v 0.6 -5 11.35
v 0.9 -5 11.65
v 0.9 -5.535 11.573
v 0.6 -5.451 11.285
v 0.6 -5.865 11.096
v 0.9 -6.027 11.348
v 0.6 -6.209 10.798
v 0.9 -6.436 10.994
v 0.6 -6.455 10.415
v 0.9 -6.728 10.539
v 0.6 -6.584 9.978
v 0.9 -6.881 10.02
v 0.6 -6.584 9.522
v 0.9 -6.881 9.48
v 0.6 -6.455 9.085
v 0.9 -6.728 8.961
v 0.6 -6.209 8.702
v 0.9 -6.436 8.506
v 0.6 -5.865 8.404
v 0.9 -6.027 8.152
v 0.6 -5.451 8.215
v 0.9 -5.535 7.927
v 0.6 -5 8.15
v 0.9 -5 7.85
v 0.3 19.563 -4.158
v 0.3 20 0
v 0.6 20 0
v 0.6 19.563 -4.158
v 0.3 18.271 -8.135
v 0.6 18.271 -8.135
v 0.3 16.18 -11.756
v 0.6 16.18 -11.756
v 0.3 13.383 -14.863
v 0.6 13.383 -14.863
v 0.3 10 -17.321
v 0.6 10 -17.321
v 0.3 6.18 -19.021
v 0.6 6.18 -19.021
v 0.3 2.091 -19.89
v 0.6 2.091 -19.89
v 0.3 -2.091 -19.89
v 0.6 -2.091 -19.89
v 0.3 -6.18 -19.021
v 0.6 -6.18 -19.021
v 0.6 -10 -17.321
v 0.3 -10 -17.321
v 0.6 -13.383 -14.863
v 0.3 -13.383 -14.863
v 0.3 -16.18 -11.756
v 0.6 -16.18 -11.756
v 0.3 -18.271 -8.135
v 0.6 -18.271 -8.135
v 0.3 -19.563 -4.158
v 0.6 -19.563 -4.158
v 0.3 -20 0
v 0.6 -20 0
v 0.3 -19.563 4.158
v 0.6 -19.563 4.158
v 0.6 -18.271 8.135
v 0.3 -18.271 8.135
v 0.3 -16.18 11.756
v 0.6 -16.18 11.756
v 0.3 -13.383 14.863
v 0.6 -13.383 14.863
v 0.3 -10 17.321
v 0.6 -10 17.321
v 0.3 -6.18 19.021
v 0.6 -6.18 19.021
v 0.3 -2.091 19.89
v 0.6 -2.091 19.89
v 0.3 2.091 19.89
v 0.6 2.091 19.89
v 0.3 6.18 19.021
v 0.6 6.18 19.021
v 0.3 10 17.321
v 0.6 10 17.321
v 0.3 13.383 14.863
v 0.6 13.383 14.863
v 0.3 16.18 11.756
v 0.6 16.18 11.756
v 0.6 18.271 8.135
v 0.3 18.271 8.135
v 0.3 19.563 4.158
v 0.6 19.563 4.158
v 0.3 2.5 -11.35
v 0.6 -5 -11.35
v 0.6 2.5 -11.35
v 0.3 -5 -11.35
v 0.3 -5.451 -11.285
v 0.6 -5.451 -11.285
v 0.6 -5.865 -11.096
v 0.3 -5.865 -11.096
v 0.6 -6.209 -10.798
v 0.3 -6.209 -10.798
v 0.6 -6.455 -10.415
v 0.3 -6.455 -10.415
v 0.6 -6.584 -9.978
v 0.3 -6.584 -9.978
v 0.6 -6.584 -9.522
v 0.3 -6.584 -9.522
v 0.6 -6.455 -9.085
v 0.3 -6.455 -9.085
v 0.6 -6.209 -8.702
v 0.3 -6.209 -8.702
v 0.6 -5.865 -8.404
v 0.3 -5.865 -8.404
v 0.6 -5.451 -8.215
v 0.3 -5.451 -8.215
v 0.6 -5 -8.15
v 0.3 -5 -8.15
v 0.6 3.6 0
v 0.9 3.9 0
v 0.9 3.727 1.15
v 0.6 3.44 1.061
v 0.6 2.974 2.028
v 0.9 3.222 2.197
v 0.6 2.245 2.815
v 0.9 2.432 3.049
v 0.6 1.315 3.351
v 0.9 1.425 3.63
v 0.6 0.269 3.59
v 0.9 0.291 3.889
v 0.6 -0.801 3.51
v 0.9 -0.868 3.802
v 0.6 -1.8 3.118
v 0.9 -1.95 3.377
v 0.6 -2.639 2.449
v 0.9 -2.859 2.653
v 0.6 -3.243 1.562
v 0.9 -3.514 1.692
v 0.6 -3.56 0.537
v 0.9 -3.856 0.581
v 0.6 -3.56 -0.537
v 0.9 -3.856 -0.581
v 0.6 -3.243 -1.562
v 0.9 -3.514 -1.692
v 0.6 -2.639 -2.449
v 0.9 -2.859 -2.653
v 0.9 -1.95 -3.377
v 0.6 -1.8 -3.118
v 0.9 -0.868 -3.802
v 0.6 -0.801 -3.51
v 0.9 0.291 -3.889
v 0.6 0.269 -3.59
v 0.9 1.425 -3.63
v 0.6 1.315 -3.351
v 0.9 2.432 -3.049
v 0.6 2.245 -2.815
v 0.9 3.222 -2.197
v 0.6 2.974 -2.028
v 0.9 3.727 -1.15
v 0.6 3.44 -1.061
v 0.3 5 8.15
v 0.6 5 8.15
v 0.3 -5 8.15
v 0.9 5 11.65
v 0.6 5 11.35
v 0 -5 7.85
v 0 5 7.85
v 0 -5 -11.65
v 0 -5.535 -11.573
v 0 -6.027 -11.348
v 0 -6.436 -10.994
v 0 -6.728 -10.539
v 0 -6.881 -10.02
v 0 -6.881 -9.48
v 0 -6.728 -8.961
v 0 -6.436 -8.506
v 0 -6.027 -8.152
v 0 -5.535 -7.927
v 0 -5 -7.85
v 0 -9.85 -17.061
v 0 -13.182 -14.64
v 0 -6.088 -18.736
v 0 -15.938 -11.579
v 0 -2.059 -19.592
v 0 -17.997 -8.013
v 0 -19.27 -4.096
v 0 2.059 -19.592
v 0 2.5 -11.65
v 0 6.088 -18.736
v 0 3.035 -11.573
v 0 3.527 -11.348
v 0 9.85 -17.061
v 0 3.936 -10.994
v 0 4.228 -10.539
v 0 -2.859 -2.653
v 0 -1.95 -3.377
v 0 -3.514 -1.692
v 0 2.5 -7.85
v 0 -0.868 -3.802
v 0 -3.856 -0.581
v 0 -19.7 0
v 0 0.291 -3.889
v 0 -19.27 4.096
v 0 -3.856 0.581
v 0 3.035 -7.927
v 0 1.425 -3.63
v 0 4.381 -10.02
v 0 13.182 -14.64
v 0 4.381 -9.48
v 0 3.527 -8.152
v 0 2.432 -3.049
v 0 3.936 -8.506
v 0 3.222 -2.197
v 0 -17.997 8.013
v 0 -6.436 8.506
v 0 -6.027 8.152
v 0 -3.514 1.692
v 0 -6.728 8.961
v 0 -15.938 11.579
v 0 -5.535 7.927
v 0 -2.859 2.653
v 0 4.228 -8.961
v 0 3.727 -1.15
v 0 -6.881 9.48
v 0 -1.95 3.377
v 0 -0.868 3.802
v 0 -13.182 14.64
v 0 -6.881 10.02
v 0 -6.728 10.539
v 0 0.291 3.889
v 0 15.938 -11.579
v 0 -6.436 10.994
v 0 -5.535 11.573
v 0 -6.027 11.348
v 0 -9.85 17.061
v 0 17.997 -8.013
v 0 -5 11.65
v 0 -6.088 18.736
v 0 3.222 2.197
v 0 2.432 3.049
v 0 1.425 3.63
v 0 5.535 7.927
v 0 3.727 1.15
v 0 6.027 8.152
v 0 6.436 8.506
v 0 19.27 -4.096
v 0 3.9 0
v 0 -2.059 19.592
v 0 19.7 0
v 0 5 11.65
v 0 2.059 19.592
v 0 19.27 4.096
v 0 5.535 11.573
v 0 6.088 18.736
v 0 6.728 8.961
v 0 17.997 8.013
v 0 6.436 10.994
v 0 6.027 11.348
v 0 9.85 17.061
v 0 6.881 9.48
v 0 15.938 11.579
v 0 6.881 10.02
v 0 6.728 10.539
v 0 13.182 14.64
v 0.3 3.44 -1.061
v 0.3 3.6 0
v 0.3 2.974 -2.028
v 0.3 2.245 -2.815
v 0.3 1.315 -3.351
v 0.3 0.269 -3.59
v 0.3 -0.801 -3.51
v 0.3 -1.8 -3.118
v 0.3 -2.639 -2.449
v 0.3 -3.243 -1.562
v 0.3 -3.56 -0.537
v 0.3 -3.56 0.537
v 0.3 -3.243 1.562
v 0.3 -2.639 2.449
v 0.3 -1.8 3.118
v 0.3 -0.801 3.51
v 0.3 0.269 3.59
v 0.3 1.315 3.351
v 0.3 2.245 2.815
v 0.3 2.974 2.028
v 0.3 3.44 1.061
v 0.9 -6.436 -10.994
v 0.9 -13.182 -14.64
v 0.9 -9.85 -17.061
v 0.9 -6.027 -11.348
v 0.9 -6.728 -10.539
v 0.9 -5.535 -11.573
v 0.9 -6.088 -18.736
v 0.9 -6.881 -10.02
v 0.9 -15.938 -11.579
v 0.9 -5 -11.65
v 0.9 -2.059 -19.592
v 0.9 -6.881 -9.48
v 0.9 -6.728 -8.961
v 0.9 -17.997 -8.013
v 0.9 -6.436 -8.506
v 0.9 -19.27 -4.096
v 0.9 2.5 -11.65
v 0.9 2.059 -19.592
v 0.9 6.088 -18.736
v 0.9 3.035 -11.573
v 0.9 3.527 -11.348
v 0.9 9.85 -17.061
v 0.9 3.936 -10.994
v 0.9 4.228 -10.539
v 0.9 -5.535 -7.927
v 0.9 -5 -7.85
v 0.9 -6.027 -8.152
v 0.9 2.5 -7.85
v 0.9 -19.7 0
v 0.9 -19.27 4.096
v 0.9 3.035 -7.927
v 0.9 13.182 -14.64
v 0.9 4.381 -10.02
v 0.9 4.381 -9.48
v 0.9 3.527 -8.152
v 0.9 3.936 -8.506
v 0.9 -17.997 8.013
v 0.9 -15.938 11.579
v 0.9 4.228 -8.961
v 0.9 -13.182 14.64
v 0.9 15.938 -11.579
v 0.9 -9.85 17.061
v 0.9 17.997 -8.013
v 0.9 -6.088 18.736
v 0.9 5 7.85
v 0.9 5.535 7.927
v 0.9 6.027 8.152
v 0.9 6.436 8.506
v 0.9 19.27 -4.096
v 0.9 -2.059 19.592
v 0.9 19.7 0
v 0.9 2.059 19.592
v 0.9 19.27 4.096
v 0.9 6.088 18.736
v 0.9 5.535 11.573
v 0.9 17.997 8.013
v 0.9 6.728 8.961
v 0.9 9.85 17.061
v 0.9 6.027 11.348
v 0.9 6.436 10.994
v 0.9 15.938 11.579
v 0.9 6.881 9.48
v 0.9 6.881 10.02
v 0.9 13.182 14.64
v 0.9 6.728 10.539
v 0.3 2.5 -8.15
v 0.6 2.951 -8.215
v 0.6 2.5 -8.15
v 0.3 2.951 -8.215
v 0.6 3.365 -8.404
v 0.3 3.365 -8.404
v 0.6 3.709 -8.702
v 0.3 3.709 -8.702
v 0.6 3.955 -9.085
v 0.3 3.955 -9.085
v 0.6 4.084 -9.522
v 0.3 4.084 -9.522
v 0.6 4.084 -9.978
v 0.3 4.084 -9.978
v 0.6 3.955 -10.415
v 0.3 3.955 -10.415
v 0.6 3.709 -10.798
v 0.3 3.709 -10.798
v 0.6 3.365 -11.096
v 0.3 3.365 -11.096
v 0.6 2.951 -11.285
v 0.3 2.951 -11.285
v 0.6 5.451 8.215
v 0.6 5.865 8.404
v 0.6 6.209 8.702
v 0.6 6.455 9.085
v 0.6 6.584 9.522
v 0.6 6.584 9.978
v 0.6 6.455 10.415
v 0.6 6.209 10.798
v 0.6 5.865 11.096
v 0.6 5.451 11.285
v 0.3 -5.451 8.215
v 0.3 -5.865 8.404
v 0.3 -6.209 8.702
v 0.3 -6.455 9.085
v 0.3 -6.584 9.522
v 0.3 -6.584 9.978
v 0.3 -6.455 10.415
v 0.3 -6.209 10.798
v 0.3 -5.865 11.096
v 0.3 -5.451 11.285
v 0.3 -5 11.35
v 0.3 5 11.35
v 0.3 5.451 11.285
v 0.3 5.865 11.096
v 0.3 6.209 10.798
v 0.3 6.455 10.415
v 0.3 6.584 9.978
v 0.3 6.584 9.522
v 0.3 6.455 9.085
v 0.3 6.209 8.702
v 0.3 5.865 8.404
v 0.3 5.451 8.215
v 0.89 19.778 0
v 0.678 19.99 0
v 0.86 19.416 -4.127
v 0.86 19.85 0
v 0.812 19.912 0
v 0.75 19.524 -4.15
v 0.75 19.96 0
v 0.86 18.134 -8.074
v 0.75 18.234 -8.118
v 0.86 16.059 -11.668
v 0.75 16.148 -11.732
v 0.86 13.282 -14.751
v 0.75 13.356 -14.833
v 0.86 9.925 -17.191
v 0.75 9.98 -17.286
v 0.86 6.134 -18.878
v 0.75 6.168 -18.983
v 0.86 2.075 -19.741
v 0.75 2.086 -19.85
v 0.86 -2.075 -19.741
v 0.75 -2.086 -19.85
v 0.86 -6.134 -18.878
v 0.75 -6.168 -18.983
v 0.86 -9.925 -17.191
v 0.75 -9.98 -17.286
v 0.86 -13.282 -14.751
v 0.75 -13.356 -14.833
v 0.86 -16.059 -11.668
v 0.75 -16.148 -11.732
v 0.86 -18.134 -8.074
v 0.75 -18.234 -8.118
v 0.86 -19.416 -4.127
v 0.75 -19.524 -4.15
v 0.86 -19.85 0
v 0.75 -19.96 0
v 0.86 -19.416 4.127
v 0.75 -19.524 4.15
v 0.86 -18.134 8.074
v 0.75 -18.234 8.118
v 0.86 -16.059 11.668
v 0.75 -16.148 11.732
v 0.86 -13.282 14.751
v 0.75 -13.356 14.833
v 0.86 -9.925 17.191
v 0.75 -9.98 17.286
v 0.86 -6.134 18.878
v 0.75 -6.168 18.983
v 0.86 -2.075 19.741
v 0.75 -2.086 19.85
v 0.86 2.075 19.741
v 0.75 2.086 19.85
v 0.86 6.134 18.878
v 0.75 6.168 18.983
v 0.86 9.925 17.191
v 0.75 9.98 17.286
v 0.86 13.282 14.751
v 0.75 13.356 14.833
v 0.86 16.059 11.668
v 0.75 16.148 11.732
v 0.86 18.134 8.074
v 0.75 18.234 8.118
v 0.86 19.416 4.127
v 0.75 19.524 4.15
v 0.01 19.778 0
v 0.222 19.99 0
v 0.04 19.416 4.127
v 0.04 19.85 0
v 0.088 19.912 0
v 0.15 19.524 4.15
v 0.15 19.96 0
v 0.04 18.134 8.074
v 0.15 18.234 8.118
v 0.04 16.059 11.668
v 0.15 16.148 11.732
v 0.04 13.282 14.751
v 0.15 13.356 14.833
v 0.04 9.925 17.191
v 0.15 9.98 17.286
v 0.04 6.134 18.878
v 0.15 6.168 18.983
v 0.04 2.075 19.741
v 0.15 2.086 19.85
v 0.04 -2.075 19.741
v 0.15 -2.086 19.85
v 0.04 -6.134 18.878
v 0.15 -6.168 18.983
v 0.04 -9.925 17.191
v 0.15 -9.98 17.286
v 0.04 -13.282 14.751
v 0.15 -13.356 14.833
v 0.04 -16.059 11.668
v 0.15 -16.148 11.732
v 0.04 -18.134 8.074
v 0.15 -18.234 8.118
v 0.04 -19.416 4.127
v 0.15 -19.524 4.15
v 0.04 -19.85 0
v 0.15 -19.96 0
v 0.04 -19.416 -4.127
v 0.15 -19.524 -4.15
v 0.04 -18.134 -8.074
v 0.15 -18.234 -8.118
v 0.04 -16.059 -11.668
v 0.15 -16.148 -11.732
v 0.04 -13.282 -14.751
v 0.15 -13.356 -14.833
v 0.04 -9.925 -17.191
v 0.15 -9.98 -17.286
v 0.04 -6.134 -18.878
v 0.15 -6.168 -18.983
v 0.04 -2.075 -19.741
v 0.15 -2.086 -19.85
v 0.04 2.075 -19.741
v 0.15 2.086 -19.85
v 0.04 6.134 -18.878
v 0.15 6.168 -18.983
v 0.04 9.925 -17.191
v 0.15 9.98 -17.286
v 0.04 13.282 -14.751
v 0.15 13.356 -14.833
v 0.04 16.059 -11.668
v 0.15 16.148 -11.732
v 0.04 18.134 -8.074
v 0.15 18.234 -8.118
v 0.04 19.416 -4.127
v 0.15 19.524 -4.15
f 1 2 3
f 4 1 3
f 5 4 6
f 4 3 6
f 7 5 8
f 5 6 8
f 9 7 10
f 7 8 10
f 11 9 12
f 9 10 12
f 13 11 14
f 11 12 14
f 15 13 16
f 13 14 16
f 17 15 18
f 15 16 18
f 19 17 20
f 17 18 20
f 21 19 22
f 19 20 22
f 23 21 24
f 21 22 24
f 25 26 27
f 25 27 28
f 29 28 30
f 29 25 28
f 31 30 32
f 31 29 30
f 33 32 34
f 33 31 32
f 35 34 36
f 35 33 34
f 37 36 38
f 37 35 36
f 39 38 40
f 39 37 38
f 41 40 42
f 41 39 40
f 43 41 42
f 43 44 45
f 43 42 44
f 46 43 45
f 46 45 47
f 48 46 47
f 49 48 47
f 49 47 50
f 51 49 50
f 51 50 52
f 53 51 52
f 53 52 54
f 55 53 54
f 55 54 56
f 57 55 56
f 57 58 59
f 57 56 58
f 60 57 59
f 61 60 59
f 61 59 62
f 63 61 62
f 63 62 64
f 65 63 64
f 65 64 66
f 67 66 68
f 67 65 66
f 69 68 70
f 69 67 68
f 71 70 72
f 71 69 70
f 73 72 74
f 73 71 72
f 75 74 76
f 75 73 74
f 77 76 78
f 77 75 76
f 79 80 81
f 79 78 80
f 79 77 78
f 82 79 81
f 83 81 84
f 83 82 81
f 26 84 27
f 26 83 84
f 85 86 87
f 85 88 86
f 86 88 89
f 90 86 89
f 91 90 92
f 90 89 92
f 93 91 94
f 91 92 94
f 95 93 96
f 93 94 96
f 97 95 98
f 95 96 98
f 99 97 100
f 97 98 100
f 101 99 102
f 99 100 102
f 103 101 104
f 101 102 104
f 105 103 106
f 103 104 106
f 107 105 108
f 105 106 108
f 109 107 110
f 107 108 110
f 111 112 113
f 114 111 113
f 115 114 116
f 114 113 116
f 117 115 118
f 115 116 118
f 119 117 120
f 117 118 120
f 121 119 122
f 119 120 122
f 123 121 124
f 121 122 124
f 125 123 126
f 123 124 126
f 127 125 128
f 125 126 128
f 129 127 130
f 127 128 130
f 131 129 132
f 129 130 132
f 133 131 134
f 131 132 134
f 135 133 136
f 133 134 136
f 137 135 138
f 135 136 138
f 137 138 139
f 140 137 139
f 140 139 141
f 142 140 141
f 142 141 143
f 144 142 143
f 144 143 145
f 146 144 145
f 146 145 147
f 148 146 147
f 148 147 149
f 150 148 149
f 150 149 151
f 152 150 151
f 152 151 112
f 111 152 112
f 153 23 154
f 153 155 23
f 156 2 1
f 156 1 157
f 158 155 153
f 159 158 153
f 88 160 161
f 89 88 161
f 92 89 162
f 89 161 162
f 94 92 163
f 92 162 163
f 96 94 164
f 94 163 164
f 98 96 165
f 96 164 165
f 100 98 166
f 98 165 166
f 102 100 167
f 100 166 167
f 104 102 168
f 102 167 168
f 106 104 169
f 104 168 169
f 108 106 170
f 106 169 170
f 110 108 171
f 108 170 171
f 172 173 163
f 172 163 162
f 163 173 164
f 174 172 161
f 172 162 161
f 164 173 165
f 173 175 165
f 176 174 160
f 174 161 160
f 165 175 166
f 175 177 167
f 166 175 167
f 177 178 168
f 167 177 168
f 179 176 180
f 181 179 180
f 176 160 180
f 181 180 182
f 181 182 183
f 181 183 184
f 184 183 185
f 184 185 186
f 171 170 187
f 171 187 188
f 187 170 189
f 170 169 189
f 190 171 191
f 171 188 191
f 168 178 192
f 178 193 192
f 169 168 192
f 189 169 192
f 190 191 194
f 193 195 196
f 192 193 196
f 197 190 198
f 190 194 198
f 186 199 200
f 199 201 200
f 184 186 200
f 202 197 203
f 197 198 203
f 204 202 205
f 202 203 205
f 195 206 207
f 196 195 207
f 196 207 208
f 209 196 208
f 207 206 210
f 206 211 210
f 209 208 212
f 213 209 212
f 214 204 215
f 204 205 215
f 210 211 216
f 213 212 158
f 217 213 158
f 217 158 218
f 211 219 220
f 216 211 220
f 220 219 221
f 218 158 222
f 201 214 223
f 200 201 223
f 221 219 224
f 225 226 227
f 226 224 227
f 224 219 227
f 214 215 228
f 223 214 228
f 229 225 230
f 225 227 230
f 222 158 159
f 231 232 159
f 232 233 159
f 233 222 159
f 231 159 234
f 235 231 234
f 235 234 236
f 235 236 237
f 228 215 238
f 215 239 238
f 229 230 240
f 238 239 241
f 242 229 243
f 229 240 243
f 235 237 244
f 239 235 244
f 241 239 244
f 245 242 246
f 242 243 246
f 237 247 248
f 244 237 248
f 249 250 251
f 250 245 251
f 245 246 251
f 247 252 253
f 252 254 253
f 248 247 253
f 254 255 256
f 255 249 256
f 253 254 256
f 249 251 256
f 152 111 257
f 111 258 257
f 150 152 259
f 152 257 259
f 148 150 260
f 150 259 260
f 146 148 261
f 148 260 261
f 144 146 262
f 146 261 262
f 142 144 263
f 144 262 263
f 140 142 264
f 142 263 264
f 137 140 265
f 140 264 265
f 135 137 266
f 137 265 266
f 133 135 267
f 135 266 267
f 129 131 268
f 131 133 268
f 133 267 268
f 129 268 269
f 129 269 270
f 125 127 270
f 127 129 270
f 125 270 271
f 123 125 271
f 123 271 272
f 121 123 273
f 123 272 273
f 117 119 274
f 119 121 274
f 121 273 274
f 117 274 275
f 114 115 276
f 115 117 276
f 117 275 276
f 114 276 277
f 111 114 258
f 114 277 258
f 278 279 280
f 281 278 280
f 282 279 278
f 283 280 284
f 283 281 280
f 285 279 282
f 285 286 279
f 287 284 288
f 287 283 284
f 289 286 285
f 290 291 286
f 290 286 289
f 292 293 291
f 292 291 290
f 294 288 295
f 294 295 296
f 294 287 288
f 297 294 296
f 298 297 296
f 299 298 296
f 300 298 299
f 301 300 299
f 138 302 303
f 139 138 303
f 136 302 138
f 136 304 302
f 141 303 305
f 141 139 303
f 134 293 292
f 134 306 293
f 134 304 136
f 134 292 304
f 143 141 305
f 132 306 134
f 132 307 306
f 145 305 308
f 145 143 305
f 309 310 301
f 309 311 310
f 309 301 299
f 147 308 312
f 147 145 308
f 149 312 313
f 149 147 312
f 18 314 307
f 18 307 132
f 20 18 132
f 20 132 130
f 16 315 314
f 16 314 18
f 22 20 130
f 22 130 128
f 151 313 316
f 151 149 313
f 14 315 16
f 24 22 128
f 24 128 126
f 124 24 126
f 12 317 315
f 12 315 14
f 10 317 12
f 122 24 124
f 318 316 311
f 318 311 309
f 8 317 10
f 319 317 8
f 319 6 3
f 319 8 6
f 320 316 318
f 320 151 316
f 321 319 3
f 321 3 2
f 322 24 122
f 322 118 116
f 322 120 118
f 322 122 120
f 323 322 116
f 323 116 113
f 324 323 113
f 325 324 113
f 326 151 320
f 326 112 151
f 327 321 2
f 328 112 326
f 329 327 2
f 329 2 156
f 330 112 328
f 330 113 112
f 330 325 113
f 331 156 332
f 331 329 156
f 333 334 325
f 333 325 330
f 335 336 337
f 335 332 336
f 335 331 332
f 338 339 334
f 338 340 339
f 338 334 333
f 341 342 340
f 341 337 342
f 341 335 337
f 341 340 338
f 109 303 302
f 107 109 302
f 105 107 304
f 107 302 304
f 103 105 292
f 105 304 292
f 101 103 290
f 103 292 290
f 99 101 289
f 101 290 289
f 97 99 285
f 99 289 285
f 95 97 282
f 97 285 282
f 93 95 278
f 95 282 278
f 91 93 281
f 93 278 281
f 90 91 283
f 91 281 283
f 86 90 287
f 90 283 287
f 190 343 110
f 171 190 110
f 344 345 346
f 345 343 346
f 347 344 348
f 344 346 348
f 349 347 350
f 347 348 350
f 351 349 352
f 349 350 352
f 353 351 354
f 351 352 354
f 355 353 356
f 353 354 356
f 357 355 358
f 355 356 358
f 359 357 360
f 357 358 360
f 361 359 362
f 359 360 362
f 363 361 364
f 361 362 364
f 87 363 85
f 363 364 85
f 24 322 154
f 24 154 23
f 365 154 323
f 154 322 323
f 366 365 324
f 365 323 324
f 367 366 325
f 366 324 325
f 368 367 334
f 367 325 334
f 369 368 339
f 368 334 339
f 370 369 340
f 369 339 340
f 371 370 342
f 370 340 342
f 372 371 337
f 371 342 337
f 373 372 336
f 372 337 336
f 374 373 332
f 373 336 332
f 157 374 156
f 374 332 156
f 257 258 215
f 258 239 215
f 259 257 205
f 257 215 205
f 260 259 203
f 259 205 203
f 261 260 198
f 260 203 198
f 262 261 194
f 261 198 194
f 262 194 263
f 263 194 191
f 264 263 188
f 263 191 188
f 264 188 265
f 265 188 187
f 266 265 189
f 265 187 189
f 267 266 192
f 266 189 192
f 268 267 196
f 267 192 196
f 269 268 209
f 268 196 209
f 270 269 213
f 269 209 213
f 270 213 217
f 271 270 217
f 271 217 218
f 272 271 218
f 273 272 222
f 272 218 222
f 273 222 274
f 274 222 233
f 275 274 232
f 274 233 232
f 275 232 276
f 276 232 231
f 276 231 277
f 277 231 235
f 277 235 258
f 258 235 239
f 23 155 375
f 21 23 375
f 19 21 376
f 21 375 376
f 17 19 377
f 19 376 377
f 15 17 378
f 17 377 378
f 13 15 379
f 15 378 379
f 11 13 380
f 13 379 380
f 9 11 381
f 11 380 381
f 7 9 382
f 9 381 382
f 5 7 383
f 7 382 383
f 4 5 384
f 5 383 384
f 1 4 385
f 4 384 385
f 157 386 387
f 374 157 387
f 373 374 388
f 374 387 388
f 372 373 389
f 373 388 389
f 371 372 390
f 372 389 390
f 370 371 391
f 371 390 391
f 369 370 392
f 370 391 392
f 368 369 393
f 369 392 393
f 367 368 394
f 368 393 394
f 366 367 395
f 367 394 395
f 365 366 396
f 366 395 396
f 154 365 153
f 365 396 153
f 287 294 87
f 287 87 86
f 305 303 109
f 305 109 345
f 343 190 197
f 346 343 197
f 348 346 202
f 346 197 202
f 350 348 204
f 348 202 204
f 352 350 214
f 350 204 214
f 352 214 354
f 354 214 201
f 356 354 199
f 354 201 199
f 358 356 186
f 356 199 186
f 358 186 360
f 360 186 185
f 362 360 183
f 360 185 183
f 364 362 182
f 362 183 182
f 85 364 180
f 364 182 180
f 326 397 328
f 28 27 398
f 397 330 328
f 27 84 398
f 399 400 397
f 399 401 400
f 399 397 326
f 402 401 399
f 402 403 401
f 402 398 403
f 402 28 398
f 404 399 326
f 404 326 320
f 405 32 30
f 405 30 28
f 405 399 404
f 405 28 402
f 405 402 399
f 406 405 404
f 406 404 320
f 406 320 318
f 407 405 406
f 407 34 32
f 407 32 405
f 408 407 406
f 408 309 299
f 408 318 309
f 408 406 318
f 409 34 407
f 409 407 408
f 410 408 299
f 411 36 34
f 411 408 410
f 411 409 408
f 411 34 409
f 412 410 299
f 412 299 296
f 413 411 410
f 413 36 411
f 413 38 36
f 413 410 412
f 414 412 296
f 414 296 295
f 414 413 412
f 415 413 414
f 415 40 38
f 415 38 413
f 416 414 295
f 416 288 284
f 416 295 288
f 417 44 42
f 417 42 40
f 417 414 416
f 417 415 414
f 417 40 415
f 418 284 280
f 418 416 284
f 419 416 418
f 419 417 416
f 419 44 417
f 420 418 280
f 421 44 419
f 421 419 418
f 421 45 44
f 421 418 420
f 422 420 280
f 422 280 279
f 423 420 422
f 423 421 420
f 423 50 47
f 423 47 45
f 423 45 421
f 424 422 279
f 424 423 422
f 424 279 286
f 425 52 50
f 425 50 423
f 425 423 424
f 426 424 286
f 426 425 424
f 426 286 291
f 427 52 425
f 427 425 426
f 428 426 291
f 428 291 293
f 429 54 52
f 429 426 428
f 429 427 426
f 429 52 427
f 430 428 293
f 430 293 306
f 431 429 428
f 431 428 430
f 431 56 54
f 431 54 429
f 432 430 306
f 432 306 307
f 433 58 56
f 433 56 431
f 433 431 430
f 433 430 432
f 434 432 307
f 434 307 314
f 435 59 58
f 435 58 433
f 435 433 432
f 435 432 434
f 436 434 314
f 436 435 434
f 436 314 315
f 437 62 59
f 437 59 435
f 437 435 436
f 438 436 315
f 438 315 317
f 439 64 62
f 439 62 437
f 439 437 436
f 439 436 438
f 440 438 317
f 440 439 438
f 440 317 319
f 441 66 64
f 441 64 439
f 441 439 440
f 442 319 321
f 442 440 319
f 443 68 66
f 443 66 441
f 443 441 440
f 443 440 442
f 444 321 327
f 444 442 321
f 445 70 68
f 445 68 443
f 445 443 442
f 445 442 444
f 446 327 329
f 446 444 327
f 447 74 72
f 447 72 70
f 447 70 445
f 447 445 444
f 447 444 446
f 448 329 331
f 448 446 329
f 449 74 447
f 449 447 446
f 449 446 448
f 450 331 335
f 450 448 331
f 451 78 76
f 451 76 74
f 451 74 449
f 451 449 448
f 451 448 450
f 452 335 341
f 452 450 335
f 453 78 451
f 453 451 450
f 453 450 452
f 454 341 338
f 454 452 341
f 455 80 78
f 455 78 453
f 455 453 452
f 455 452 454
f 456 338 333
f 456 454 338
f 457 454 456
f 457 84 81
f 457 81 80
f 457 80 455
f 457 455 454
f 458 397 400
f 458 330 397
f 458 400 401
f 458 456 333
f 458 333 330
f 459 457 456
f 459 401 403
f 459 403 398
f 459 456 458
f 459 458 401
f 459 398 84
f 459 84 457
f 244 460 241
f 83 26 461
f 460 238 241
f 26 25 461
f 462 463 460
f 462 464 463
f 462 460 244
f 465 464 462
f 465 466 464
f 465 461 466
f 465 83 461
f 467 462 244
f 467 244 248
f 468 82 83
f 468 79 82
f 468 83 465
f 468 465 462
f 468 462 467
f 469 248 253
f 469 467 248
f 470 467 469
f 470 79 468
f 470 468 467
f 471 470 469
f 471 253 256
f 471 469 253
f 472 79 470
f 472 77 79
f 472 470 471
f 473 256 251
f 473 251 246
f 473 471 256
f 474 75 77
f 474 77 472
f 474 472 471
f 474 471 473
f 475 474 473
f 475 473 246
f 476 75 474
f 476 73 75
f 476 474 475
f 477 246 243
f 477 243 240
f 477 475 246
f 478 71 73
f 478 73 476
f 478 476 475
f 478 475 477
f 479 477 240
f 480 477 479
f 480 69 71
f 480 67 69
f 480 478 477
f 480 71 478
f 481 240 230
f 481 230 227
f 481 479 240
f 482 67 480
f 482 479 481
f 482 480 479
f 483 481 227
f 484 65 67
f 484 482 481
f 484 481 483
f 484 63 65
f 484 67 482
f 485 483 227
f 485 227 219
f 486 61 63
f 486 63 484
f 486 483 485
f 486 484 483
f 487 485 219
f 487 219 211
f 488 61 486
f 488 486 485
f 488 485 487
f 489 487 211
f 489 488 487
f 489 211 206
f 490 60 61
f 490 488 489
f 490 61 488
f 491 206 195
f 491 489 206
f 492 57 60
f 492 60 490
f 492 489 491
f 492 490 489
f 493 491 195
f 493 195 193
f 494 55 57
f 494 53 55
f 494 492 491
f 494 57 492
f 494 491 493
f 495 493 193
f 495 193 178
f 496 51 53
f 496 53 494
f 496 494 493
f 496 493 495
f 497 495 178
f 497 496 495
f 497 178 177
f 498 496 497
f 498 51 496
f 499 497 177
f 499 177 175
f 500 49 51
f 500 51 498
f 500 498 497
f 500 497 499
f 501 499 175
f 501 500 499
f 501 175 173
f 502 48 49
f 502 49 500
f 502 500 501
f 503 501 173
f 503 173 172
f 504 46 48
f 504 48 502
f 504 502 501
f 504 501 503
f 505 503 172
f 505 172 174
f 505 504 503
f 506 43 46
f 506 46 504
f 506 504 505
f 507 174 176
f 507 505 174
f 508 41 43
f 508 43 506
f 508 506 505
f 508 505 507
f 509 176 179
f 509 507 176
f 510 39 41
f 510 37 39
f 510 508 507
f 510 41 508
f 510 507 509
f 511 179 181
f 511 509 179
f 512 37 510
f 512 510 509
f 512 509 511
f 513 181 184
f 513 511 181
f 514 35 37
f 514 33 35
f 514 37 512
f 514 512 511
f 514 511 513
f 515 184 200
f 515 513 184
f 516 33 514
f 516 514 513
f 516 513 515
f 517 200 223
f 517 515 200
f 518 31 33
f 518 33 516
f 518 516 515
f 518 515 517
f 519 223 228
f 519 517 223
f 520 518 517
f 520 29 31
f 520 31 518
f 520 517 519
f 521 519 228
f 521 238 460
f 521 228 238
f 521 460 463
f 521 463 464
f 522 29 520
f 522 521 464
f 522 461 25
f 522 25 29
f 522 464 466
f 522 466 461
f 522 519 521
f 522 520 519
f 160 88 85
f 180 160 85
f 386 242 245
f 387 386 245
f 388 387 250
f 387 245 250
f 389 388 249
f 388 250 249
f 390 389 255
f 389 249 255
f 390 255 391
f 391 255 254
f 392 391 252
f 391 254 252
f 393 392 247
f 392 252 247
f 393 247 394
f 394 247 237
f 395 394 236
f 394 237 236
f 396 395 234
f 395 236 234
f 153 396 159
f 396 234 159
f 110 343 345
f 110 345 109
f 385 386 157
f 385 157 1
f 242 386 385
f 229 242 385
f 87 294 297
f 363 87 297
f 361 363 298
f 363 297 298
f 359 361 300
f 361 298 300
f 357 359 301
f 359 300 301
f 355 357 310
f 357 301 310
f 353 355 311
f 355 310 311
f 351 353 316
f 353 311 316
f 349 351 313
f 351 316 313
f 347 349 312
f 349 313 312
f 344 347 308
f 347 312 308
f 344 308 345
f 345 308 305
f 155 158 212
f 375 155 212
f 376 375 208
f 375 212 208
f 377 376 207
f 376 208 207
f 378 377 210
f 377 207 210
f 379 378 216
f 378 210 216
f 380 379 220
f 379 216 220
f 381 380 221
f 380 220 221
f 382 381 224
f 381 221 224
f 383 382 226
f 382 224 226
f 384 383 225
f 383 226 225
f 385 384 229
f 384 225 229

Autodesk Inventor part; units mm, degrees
ref_plane "YZ Plane" through (0, 0, 0) normal (1, 0, 0) x (0, 1, 0)
ref_plane "XZ Plane" through (0, 0, 0) normal (0, 1, 0) x (-1, 0, 0)
ref_plane "XY Plane" through (0, 0, 0) normal (0, 0, 1) x (1, 0, 0)
sketch "Sketch1" plane through (0, 0, 0) normal (1, 0, 0) x (0, 1, 0)
  circle A0 centre (0, 0) radius 3.6
  line L0 (-5, -9.75) -> (5, -9.75)
  line L1 (5, -9.75) -> (5, 9.75)
  line L2 (5, 9.75) -> (-5, 9.75)
  line L3 (-5, 9.75) -> (-5, -9.75)
  line L4 (-5, -9.75) -> (5, 9.75) construction
  line L5 (5, -9.75) -> (-5, 9.75) construction
  line L6 (5, 9.75) -> (-5, 9.75) construction
  line L7 (5, 11.35) -> (-5, 11.35)
  line L8 (-5, 8.15) -> (5, 8.15)
  arc A1 (5, 8.15) -> (5, 11.35) centre (5, 9.75) ccw
  arc A2 (-5, 11.35) -> (-5, 8.15) centre (-5, 9.75) ccw
  line L9 (-5, -9.75) -> (2.5, -9.75) construction
  line L10 (-5, -11.35) -> (2.5, -11.35)
  line L11 (2.5, -8.15) -> (-5, -8.15)
  arc A3 (-5, -8.15) -> (-5, -11.35) centre (-5, -9.75) ccw
  arc A4 (2.5, -11.35) -> (2.5, -8.15) centre (2.5, -9.75) ccw
  circle A5 centre (0, 0) radius 20
  point P0 (0, 9.75)
  point P1 (-1.25, -9.75)
  dimension "d0" = 7.2
  dimension "d1" = 19.5
  dimension "d2" = 10
  dimension "d3" = 1.6
  dimension "d4" = 7.5
  dimension "d5" = 40
  dimension "d12" = 1.6
extrude "Extrusion1" add sketch "Sketch1" along normal blind 0.9 contours A4 L11 L3 L8 L1 L0 | A5
fillet "Fillet1" radius 0.3 2 edges at (0.9, -20, 0) (0, -20, 0)
chamfer "Chamfer1" distance 0.3 angle 45 18 edges at (0.9, 0, 8.15) (0.9, -6.6, 9.75) (0.9, 0, 11.35) (0.9, 6.6, 9.75) (0.9, -3.6, 0) (0, -3.6, 0) (0, -1.25, -11.35) (0, -6.6, -9.75) (0, -1.25, -8.15) (0, 4.1, -9.75) (0.9, -1.25, -11.35) (0.9, -6.6, -9.75) (0.9, -1.25, -8.15) (0.9, 4.1, -9.75) (0, 0, 8.15) (0, -6.6, 9.75) (0, 0, 11.35) (0, 6.6, 9.75)
properties part number "CameraModuleSymbolDisc"
